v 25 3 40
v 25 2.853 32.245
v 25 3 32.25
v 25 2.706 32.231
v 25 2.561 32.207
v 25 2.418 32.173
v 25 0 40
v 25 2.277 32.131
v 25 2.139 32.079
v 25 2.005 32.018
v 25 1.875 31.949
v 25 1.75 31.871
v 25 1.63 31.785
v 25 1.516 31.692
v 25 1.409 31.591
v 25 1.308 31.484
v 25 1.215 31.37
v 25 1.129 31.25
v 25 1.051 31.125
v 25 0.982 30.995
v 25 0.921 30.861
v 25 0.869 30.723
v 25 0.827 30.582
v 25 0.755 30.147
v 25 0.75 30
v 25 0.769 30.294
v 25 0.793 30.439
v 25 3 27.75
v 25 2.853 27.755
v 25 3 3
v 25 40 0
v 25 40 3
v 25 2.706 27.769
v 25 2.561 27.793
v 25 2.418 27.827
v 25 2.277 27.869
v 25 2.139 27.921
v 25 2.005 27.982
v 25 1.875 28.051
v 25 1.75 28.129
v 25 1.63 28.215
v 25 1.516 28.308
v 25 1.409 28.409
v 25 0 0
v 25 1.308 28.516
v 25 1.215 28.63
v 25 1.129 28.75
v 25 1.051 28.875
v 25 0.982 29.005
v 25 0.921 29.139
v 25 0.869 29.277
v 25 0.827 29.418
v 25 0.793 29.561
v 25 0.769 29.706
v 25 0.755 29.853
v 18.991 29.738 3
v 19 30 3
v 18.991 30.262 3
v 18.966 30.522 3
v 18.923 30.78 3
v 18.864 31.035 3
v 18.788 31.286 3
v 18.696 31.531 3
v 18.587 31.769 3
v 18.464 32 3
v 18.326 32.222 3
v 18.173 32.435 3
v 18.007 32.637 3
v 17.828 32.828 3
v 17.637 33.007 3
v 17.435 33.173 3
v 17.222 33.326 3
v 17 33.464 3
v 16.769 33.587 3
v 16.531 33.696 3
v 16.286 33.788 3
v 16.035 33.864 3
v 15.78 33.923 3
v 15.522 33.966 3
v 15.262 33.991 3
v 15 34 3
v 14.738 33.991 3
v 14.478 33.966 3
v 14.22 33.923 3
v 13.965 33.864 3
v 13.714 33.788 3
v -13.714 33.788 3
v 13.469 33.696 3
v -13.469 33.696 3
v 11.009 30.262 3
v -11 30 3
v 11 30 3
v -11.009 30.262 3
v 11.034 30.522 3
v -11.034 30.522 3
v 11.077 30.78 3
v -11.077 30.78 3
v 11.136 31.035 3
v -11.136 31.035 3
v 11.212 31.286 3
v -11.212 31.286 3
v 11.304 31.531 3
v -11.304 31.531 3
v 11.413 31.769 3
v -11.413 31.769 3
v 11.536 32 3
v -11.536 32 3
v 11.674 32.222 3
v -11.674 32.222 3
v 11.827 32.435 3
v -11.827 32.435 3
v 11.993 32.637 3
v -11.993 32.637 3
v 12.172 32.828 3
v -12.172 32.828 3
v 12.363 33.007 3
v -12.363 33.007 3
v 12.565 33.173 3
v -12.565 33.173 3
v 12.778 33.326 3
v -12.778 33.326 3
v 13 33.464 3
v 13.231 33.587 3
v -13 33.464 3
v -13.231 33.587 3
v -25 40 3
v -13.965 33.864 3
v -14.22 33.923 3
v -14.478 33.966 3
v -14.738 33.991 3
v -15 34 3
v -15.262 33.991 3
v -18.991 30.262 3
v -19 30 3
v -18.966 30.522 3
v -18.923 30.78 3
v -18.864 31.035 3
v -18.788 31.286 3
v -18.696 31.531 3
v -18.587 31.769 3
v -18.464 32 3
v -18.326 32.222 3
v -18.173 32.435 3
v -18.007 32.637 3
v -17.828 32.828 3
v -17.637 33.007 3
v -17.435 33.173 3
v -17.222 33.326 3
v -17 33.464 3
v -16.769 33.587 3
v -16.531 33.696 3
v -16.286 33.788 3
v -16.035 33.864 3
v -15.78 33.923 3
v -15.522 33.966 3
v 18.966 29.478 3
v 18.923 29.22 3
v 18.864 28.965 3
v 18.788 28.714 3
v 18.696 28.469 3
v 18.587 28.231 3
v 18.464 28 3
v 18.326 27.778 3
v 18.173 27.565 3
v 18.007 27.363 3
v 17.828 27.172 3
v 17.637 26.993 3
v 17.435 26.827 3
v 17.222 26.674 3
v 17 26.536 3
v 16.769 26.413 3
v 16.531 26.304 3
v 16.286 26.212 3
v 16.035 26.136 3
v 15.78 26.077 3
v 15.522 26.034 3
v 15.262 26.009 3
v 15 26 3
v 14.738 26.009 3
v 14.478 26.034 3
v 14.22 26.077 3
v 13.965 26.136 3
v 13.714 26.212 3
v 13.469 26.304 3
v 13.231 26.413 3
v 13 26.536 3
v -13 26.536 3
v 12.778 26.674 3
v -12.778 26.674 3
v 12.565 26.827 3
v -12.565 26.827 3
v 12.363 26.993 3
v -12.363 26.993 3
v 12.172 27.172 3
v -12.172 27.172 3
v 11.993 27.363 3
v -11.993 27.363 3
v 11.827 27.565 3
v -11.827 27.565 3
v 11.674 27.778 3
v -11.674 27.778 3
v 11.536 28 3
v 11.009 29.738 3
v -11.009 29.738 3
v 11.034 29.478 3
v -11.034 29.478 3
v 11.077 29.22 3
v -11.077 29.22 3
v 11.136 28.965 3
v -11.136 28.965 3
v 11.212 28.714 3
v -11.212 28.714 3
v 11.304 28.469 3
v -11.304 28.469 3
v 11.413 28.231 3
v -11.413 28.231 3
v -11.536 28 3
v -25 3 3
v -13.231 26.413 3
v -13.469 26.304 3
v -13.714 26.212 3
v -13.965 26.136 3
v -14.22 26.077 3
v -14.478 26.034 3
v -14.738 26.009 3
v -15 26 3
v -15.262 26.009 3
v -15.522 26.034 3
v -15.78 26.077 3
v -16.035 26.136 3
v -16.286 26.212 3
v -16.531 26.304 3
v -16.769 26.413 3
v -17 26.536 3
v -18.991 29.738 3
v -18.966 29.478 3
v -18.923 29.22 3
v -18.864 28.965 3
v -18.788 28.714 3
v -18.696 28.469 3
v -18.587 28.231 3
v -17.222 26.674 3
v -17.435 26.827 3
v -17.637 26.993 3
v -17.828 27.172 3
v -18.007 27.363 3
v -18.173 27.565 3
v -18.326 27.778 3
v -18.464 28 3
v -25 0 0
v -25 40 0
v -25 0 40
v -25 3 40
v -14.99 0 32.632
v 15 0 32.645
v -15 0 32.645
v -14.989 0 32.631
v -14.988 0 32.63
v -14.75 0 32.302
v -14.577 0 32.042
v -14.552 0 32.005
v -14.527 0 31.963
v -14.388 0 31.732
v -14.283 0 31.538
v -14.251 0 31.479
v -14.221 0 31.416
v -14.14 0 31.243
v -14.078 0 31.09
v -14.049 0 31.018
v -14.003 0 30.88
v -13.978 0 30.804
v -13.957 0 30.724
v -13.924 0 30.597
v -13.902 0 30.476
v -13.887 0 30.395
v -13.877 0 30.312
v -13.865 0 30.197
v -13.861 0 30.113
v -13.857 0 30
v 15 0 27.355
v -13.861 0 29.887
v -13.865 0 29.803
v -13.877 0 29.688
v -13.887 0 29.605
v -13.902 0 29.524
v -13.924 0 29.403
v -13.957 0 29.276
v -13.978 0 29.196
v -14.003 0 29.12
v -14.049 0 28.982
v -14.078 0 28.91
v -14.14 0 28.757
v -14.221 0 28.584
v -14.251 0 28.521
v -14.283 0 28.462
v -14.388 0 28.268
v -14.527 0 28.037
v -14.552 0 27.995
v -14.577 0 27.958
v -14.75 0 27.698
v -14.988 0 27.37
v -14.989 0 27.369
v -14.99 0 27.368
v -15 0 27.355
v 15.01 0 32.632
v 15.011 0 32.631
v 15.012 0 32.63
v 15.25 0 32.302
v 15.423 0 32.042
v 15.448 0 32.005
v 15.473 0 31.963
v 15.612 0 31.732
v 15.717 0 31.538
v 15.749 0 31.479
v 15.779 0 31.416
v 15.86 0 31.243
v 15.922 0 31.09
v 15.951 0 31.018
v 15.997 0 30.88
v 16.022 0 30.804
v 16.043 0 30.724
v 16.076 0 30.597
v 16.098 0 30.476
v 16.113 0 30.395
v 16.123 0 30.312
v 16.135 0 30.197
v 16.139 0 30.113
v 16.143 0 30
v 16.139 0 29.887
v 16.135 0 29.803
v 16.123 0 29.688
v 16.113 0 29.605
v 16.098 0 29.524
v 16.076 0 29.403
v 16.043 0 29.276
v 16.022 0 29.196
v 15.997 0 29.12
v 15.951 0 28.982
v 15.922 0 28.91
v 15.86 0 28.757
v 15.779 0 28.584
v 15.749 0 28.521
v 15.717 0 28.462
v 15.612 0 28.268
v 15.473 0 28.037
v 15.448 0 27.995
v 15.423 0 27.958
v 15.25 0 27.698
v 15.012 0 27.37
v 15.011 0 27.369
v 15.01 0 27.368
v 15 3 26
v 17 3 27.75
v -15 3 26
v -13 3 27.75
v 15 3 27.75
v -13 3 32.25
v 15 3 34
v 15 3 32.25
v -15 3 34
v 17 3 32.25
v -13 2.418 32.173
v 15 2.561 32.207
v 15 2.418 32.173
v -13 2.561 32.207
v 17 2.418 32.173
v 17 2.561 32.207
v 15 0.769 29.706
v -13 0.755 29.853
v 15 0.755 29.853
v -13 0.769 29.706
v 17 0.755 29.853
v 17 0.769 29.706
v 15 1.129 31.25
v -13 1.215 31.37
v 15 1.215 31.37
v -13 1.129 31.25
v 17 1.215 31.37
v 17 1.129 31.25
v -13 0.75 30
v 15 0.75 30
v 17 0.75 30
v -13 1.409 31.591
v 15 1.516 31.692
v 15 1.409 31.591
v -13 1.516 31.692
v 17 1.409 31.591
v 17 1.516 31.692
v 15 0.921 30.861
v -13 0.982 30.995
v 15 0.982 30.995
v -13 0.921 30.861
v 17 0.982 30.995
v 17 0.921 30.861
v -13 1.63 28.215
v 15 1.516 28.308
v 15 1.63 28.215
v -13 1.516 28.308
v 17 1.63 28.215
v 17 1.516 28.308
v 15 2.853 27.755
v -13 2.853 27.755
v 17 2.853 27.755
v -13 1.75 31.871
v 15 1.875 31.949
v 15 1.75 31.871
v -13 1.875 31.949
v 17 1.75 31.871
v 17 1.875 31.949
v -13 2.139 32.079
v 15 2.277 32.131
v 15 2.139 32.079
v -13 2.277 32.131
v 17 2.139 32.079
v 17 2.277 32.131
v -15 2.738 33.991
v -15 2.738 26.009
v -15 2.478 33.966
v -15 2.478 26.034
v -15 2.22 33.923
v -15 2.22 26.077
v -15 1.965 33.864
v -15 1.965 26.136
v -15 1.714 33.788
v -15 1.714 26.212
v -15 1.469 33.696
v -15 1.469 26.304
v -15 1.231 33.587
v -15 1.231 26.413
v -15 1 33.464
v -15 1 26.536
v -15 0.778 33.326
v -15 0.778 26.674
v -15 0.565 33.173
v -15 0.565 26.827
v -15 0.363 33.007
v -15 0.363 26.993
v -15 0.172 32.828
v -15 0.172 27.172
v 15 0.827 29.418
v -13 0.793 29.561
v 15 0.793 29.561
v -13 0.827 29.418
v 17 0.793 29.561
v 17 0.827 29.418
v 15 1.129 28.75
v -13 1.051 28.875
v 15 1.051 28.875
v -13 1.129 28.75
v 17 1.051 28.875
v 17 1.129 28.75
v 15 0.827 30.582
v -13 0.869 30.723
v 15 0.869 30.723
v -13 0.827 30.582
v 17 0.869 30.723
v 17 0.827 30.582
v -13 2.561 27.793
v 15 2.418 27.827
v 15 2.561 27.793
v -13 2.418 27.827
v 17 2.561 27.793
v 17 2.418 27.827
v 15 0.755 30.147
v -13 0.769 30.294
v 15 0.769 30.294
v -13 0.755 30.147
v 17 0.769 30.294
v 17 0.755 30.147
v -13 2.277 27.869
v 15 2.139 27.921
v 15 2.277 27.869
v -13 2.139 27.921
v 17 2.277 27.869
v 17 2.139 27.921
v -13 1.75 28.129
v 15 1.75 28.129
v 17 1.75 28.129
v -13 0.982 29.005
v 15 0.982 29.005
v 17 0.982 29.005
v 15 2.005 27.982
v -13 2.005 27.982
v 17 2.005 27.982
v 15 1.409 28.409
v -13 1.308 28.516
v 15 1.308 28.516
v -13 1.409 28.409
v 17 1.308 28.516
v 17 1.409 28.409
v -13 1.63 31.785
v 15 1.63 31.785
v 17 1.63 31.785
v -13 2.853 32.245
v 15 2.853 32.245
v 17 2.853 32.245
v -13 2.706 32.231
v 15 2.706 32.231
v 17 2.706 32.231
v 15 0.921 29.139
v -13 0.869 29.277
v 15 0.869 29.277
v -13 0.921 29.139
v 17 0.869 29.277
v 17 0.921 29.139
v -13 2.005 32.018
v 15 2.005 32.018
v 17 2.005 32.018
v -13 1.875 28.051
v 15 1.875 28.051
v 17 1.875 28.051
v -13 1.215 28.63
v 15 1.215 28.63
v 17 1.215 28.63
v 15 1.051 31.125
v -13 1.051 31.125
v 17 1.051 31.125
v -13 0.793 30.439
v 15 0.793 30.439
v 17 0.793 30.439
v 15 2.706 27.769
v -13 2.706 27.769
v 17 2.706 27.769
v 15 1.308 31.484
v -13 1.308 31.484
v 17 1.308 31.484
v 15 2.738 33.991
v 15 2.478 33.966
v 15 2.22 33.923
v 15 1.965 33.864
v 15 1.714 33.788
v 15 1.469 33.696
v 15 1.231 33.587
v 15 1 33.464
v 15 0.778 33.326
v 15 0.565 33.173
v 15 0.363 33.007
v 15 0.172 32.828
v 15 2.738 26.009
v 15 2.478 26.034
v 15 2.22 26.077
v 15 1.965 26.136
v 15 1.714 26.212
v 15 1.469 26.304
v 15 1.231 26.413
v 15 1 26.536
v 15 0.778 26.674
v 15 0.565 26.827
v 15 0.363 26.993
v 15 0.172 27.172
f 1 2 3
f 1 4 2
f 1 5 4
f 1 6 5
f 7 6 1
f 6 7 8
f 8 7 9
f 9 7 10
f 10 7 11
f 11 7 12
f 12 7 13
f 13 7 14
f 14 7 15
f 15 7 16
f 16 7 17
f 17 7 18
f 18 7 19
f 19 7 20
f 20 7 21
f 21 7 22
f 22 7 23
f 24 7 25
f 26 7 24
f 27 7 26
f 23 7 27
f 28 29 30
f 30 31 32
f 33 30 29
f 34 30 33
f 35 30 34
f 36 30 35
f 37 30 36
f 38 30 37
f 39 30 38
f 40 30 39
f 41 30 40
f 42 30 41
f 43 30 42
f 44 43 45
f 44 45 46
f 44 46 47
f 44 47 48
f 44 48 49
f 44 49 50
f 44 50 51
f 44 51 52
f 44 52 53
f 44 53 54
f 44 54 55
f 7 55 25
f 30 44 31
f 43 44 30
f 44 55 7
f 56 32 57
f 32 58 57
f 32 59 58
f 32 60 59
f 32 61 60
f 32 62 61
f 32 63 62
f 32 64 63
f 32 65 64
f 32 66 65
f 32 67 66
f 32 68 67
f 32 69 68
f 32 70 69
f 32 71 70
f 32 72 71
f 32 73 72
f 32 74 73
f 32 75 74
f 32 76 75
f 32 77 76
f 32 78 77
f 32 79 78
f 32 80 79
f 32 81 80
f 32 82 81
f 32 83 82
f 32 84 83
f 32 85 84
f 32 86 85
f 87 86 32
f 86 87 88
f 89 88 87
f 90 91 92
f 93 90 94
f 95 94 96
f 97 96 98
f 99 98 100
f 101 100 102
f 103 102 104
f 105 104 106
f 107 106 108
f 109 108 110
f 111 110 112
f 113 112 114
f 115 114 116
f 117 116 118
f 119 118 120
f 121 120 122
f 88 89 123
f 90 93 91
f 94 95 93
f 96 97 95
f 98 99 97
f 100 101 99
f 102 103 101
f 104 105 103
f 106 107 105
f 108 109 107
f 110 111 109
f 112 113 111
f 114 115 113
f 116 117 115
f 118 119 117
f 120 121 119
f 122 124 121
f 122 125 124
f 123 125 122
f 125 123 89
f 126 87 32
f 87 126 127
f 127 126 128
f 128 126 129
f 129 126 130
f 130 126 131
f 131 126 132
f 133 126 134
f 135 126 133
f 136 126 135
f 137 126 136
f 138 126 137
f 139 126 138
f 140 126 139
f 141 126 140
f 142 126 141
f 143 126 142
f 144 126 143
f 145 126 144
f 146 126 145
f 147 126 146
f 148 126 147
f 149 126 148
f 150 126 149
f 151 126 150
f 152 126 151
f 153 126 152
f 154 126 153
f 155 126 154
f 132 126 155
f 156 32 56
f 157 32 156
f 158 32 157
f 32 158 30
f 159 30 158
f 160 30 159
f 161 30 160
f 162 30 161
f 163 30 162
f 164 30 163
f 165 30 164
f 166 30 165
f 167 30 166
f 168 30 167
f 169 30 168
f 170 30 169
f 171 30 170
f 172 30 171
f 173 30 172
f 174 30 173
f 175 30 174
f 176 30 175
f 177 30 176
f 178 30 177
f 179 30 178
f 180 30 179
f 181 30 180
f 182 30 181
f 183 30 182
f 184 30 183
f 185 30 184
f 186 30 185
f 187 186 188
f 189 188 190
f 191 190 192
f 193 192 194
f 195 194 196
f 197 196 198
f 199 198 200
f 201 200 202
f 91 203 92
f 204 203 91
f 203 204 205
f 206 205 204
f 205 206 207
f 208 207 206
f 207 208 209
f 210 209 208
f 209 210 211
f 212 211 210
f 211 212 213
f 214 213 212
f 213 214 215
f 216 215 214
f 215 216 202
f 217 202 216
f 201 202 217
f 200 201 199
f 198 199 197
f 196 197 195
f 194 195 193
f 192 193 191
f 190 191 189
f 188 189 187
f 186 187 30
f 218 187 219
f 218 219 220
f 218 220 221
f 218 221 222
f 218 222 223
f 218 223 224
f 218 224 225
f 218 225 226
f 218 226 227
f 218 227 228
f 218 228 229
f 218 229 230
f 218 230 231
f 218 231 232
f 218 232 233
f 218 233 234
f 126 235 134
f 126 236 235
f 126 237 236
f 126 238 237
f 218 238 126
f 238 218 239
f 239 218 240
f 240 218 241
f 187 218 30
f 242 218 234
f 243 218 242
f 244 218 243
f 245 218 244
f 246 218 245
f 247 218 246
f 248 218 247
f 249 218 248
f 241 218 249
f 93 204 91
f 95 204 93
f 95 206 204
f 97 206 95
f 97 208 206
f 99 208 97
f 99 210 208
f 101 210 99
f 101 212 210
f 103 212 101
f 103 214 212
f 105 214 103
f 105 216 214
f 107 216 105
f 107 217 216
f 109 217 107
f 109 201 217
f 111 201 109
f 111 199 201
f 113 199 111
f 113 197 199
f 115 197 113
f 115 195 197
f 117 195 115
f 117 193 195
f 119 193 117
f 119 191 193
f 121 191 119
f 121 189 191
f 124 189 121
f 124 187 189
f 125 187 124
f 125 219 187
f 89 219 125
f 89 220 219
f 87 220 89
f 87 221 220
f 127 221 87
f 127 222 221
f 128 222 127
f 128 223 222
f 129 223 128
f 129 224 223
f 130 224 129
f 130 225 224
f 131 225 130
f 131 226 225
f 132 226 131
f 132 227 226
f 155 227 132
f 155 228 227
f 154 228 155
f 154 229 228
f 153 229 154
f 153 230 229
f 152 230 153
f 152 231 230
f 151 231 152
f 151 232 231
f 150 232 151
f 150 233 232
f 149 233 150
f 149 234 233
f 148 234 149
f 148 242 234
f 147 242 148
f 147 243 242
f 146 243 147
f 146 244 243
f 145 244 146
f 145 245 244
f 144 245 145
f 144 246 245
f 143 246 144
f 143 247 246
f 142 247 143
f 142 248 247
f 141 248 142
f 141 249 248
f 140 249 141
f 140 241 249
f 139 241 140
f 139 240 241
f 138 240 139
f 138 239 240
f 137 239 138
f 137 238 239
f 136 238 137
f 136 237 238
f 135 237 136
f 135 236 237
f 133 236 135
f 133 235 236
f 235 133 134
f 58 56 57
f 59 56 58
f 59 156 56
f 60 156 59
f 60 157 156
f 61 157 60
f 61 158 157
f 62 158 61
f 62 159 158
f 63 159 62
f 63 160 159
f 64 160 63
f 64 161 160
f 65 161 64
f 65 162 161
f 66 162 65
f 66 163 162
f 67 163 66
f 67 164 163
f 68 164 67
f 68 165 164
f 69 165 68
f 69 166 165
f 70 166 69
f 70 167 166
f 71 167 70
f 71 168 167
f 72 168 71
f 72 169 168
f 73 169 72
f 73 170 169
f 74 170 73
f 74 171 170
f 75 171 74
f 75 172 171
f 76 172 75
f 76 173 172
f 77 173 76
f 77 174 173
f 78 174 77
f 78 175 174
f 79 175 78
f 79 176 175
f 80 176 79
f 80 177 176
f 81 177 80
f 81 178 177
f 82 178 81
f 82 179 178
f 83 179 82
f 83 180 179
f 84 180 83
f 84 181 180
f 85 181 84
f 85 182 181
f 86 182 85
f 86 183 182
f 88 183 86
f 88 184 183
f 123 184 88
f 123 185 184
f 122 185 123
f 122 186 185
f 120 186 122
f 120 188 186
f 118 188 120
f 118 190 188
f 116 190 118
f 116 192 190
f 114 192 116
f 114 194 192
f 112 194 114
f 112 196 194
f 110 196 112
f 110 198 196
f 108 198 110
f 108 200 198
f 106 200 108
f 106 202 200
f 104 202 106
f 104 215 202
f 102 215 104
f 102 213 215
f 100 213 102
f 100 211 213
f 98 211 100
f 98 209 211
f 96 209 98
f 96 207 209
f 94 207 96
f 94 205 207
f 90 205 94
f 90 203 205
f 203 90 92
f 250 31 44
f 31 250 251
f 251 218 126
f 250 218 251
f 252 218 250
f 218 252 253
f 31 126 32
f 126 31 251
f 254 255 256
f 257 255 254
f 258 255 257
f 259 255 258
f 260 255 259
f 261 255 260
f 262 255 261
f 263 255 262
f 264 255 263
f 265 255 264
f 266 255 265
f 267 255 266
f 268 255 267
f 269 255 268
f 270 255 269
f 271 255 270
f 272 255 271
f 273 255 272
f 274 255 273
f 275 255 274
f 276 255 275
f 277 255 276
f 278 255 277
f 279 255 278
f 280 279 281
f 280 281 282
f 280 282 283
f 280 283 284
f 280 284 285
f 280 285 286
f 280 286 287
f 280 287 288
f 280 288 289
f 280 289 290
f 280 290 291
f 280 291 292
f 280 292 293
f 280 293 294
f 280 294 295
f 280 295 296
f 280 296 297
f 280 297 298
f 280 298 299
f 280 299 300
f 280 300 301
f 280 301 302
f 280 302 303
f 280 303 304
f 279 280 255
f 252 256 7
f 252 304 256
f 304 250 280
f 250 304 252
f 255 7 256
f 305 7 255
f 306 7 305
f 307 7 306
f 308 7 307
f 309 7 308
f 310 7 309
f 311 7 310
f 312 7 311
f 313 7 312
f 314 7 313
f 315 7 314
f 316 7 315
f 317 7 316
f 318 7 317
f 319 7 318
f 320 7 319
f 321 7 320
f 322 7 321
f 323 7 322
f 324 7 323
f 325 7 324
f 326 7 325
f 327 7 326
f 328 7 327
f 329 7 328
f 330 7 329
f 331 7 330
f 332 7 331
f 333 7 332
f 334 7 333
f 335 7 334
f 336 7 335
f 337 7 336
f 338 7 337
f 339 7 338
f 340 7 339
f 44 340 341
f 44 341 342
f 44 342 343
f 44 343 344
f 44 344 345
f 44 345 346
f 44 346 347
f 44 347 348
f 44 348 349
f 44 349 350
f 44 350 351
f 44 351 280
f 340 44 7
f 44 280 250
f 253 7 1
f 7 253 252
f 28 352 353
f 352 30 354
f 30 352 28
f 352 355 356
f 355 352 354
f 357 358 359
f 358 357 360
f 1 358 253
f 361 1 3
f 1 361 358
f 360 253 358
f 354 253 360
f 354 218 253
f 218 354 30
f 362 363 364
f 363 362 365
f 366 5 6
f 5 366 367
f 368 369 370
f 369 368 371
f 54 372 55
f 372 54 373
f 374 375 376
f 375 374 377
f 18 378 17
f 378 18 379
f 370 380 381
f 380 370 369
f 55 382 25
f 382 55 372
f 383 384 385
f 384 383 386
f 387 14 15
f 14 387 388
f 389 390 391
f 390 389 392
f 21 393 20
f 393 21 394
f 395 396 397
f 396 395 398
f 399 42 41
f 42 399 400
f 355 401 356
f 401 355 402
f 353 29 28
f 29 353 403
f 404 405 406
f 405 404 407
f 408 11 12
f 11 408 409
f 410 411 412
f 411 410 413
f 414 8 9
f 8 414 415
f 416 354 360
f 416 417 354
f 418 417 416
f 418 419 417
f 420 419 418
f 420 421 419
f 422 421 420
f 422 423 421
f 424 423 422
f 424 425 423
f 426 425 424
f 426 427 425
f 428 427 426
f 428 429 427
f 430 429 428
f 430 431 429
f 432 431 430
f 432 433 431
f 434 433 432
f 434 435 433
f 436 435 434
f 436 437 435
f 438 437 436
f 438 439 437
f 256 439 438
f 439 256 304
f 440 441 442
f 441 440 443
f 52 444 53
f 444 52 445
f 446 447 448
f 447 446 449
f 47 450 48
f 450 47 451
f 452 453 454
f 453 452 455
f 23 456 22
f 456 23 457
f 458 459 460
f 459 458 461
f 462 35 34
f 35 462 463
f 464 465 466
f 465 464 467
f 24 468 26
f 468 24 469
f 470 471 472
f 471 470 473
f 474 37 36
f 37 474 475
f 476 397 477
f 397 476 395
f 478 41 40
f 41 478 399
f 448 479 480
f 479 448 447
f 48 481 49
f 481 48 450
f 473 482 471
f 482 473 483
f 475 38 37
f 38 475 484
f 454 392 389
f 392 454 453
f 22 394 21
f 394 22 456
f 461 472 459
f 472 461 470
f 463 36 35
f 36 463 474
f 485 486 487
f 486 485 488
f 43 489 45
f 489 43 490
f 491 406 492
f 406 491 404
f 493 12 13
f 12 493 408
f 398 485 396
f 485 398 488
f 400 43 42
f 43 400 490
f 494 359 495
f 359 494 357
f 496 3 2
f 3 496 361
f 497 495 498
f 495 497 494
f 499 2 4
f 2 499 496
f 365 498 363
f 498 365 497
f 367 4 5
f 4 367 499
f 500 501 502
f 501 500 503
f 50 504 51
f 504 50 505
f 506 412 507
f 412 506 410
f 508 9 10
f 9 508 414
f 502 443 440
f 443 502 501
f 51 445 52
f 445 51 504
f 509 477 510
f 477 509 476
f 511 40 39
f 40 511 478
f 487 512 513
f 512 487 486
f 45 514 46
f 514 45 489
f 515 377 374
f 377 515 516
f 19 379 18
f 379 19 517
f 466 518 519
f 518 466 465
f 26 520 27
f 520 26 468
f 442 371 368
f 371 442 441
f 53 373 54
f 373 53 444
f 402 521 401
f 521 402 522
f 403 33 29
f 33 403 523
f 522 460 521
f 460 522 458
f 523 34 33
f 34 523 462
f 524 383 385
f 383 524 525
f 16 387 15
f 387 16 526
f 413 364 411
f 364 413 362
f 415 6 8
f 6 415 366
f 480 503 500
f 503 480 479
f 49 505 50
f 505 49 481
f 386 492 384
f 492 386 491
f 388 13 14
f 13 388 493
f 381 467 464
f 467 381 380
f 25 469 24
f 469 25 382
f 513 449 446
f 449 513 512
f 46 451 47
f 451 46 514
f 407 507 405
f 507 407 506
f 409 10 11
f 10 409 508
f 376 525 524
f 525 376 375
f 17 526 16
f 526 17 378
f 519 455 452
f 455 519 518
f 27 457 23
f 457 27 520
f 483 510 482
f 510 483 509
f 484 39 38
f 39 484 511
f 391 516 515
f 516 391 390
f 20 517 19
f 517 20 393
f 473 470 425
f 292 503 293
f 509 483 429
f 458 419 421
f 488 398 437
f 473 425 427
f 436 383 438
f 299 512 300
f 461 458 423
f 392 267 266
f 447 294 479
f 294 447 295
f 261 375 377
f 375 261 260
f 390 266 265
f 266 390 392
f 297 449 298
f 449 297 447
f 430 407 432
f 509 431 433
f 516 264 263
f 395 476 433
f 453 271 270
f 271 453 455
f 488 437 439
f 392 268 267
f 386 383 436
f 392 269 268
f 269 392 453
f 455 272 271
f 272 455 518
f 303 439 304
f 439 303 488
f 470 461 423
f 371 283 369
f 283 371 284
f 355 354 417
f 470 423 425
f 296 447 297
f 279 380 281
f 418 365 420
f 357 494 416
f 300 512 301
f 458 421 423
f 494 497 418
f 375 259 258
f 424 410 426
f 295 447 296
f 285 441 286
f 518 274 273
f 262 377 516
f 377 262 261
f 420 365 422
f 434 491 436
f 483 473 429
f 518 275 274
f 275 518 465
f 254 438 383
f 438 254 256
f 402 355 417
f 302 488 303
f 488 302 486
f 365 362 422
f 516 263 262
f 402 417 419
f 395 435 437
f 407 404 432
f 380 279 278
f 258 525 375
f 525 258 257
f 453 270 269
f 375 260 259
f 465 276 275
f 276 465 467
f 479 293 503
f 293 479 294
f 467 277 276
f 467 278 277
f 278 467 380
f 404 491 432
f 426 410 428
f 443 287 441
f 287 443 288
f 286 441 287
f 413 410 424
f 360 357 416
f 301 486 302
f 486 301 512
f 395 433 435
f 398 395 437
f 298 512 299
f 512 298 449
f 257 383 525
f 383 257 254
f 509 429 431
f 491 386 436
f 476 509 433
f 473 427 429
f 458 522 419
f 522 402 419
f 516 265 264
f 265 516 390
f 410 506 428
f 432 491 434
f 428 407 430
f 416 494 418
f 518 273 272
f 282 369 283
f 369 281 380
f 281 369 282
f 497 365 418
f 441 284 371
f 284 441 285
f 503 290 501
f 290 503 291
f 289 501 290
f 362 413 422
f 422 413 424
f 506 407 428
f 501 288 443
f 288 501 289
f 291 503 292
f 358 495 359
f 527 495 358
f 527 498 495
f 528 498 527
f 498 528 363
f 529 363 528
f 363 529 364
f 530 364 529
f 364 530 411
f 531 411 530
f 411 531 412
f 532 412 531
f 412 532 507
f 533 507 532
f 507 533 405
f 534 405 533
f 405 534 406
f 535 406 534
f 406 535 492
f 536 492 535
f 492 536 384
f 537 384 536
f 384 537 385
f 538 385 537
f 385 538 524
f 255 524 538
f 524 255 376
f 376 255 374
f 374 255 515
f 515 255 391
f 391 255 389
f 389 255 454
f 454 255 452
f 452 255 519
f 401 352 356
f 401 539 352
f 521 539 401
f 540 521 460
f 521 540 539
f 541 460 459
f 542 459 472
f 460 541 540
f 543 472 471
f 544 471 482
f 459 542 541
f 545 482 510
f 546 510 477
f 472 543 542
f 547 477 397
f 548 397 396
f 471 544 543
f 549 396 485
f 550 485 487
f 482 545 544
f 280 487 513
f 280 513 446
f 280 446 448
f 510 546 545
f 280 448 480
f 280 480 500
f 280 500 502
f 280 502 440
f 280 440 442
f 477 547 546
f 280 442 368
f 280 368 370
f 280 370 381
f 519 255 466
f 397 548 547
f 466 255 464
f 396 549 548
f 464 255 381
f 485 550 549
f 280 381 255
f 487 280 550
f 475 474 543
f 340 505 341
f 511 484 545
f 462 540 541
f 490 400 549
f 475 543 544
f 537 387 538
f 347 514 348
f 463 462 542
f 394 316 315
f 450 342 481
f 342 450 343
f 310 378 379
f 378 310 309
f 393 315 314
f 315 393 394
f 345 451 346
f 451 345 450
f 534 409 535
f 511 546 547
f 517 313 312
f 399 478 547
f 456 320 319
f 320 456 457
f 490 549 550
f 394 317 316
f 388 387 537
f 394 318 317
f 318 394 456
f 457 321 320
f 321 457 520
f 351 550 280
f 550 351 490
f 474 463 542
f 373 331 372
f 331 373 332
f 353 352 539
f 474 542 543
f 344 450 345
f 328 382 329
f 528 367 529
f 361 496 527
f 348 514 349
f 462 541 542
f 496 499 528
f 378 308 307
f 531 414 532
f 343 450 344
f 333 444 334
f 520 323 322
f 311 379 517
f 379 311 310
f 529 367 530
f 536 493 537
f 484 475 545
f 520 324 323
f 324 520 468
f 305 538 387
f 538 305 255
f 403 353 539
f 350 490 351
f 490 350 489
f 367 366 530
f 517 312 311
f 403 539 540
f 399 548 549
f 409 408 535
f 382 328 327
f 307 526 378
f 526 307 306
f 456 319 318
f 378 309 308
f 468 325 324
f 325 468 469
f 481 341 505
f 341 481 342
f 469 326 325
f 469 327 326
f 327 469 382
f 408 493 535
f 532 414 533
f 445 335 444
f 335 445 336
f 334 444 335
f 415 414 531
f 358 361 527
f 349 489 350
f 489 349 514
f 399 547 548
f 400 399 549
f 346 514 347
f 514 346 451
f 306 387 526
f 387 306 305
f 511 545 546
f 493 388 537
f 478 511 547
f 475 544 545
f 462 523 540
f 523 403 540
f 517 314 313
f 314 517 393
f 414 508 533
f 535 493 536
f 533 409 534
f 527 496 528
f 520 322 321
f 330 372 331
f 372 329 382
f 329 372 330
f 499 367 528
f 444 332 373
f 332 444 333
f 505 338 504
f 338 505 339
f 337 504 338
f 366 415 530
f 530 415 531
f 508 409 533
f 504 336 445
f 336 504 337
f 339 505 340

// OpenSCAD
// L-bracket with 4x M4 countersunk holes (2 per flange)
// Inner corner at origin: horizontal flange extends +Y, vertical flange extends +Z

$fn = 96;

module countersunk_hole(shaft_d=4.5, head_d=8, head_h=2, through=100)
{
    // Cut with axis along +Z (top at z=0, extends to -Z)
    union() {
        cylinder(h=through, d=shaft_d, center=false);                       // through hole
        cylinder(h=head_h,  d1=head_d, d2=shaft_d, center=false);          // countersink
    }
}

module l_bracket()
{
    w = 50;   // X size
    d = 40;   // Y (horizontal) / Z (vertical) size
    t = 3;    // thickness of both flanges

    // Hole centers along X on the centerline; 10mm from outer edges.
    // Outer edges at x=±w/2 => center positions at x=±(w/2 - 10)
    hx = [-(w/2 - 10), (w/2 - 10)];

    // Hole center lines 10mm inside from outer edge.
    // Horizontal flange outer edge at Y=d => hole centers at y=d-10
    // Vertical flange outer edge at Z=d => hole centers at z=d-10
    hy = d - 10;
    hz = d - 10;

    difference() {
        union() {
            // Horizontal flange: X[-w/2..+w/2], Y[0..d], Z[0..t]
            translate([-w/2, 0, 0])
                cube([w, d, t]);

            // Vertical flange: X[-w/2..+w/2], Y[0..t], Z[0..d]
            translate([-w/2, 0, 0])
                cube([w, t, d]);
        }

        // --- Horizontal flange holes (2x) ---
        // Countersink should face the outer side: +Z face (top of horizontal flange).
        // We cut by placing hole primitive at z=t and cutting downward (-Z).
        for (x = hx) {
            translate([x, hy, t])
                // hole axis along -Z: already built as cutting from z=0 downwards,
                // so just translate; no flips needed.
                countersunk_hole(shaft_d=4.5, head_d=8, head_h=2, through=100);
        }

        // --- Vertical flange holes (2x) ---
        // Countersink should face outer side: +Y face of the vertical flange (away from inner corner).
        // Place at y=t and cut toward -Y (i.e., axis along -Y).
        for (x = hx) {
            translate([x, t, hz])
                rotate([0, 90, 0])   // rotate Z-axis hole to Y-axis
                    // now the countersink axis direction should be toward -Y.
                    // The countersunk_hole is built to extend along -Z from its local origin.
                    // After rotation, that becomes extension along -Y.
                    countersunk_hole(shaft_d=4.5, head_d=8, head_h=2, through=100);
        }
    }
}

l_bracket();
